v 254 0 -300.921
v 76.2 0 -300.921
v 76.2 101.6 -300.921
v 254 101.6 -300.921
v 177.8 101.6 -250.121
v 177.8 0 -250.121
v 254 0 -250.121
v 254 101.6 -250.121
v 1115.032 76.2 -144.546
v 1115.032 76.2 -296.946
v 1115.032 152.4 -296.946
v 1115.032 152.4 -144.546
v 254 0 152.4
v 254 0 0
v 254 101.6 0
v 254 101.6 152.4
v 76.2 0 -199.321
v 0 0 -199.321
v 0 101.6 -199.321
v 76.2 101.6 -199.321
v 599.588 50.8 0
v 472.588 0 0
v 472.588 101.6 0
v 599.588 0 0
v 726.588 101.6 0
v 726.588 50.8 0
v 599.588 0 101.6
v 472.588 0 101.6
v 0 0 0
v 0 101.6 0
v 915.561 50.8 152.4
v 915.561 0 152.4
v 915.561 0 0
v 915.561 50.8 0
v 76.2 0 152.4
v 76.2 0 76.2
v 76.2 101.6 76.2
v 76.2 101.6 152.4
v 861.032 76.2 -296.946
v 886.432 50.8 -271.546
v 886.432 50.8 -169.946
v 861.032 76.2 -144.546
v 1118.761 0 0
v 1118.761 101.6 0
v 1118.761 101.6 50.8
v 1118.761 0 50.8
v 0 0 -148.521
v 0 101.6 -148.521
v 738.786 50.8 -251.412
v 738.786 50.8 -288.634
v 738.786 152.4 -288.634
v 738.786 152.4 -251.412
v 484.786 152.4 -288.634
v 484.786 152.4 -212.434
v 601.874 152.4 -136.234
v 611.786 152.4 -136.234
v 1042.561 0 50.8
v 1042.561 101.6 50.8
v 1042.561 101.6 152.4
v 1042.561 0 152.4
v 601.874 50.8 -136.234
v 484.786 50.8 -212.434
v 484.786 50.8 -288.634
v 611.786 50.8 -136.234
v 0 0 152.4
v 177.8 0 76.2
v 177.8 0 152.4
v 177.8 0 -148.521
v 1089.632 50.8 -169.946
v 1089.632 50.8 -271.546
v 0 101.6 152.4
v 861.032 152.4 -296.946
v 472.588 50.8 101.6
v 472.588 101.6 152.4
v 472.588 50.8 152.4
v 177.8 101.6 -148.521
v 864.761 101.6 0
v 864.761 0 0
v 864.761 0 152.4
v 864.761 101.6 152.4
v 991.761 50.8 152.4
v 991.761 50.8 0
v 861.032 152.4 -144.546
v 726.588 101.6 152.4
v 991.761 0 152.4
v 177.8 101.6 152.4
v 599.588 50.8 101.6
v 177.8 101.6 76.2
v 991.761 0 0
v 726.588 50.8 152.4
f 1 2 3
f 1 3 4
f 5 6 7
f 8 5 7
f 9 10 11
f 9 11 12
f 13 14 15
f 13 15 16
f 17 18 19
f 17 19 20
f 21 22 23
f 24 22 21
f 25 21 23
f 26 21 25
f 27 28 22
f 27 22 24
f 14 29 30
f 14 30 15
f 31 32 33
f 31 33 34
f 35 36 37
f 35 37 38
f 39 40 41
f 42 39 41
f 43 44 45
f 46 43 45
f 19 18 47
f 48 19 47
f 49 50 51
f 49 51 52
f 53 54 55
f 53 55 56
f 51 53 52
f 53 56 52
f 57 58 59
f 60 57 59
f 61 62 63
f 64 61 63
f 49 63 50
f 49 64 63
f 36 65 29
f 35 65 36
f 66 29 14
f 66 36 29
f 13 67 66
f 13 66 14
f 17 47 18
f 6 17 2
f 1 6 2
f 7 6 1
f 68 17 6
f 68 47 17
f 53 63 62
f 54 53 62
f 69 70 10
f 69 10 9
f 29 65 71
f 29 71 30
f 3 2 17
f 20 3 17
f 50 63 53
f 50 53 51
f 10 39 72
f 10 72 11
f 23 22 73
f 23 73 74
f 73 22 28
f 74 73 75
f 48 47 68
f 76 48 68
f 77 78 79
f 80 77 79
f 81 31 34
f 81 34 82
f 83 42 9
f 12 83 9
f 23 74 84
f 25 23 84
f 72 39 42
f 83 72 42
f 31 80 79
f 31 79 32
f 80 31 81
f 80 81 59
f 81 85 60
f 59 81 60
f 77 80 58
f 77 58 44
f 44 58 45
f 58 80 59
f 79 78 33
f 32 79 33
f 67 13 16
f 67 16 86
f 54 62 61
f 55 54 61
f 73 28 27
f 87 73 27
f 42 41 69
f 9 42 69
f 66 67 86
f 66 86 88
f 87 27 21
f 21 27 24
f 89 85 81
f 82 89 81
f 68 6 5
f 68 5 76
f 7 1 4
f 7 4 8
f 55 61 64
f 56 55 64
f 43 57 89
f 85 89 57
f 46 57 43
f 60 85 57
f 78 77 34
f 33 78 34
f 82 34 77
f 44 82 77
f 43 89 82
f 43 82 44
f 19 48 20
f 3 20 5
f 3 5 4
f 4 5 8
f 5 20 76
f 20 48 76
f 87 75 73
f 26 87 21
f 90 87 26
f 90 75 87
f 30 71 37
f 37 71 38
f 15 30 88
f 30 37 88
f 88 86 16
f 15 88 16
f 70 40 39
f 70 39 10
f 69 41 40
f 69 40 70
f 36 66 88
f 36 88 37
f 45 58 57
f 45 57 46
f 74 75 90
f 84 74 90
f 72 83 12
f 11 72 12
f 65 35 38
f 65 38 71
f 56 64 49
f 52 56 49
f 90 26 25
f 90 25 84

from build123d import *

# Parameters (mm, degrees)
F1_DEPTH  = 101.6
F2_W      = 254
F2_H      = 152.4
F3_DEPTH  = 101.6
F5_DEPTH  = 50.8
F6_W      = 254
F6_H      = 152.4
F7_DEPTH  = 101.6
F8_W      = 76.2
F8_H      = 50.8
F9_DEPTH  = 152.4
F10_W     = 76.2
F10_H     = 101.6
F11_DEPTH = 101.6
F12_W     = 254
F12_H     = 152.4
F13_DEPTH = 101.6
F14_W     = 76.2
F14_H     = 101.6
F15_DEPTH = 101.6
F16_W     = 76.2
F16_H     = 101.6
F17_DEPTH = 101.6
F18_W     = 254
F18_H     = 152.4
F19_DEPTH = 101.6
F21_DEPTH = 101.6
F22_W     = 254
F22_H     = 152.4
F23_DEPTH = 101.6
F24_SIZE  = 25.4


with BuildPart() as f1:
    # F0 (on Front) → F1 (new body)
    with BuildSketch(Plane.XZ):
        Polygon((0, 152.4), (0, 0), (254, 0), (254, 152.4), (177.8, 152.4), (177.8, 76.2), (76.2, 76.2), (76.2, 152.4), align=None)
    extrude(amount=-F1_DEPTH)


with BuildPart() as f3:
    # F2 (on Front) → F3 (new body)
    with BuildSketch(Plane.XZ):
        with Locations((599.587875, 76.2)):
            Rectangle(F2_W, F2_H)
    extrude(amount=-F3_DEPTH)

    # F4 (on face) → F5 (cut)
    with BuildSketch(Plane.XZ):
        Polygon((726.587875, 152.4), (472.587875, 152.4), (472.587875, 101.6), (599.587875, 101.6), (599.587875, 0), (726.587875, 0), align=None)
    extrude(amount=-F5_DEPTH, mode=Mode.SUBTRACT)


with BuildPart() as f7:
    # F6 (on Front) → F7 (new body)
    with BuildSketch(Plane.XZ):
        with Locations((991.761114, 76.2)):
            Rectangle(F6_W, F6_H)
    extrude(amount=-F7_DEPTH)

    # F8 (on face) → F9 (cut)
    with BuildSketch(Plane.XY.offset(152.4)):
        with Locations((953.661114, 25.4)):
            Rectangle(F8_W, F8_H)
    extrude(amount=-F9_DEPTH, mode=Mode.SUBTRACT)

    # F10 (on face) → F11 (cut)
    with BuildSketch(Plane.XZ):
        with Locations((1080.661114, 101.6)):
            Rectangle(F10_W, F10_H)
    extrude(amount=-F11_DEPTH, mode=Mode.SUBTRACT)


with BuildPart() as f13:
    # F12 (on Front) → F13 (new body)
    with BuildSketch(Plane.XZ):
        with Locations((127, -224.72126)):
            Rectangle(F12_W, F12_H)
    extrude(amount=-F13_DEPTH)

    # F14 (on face) → F15 (cut)
    with BuildSketch(Plane.XZ):
        with Locations((38.1, -250.12126)):
            Rectangle(F14_W, F14_H)
    extrude(amount=-F15_DEPTH, mode=Mode.SUBTRACT)

    # F16 (on face) → F17 (cut)
    with BuildSketch(Plane.XZ):
        with Locations((215.9, -199.32126)):
            Rectangle(F16_W, F16_H)
    extrude(amount=-F17_DEPTH, mode=Mode.SUBTRACT)


with BuildPart() as f19:
    # F18 (on face) → F19 (new body)
    with BuildSketch(Plane.XZ.offset(-50.8)):
        with Locations((611.785993, -212.433896)):
            Rectangle(F18_W, F18_H)
    extrude(amount=-F19_DEPTH)

    # F20 (on face) → F21 (cut)
    with BuildSketch(Plane.XZ.offset(-50.8)):
        Polygon((484.785993, -136.233896), (484.785993, -212.433896), (601.874208, -136.233896), align=None)
        Polygon((738.785993, -136.233896), (611.785993, -136.233896), (738.785993, -251.412464), align=None)
    extrude(amount=-F21_DEPTH, mode=Mode.SUBTRACT)


with BuildPart() as f23:
    # F22 (on face) → F23 (new body)
    with BuildSketch(Plane.XZ.offset(-50.8)):
        with Locations((988.032371, -220.746366)):
            Rectangle(F22_W, F22_H)
    extrude(amount=-F23_DEPTH)

    # F24
    f24_edges = [f23.edges().sort_by_distance(p)[0] for p in [
        (988.032371, 50.8, -144.546366),
        (861.032371, 50.8, -220.746366),
        (988.032371, 50.8, -296.946366),
        (1115.032371, 50.8, -220.746366),
    ]]
    chamfer(f24_edges, length=F24_SIZE)


solid = Compound([f1.part, f3.part, f7.part, f13.part, f19.part, f23.part])
